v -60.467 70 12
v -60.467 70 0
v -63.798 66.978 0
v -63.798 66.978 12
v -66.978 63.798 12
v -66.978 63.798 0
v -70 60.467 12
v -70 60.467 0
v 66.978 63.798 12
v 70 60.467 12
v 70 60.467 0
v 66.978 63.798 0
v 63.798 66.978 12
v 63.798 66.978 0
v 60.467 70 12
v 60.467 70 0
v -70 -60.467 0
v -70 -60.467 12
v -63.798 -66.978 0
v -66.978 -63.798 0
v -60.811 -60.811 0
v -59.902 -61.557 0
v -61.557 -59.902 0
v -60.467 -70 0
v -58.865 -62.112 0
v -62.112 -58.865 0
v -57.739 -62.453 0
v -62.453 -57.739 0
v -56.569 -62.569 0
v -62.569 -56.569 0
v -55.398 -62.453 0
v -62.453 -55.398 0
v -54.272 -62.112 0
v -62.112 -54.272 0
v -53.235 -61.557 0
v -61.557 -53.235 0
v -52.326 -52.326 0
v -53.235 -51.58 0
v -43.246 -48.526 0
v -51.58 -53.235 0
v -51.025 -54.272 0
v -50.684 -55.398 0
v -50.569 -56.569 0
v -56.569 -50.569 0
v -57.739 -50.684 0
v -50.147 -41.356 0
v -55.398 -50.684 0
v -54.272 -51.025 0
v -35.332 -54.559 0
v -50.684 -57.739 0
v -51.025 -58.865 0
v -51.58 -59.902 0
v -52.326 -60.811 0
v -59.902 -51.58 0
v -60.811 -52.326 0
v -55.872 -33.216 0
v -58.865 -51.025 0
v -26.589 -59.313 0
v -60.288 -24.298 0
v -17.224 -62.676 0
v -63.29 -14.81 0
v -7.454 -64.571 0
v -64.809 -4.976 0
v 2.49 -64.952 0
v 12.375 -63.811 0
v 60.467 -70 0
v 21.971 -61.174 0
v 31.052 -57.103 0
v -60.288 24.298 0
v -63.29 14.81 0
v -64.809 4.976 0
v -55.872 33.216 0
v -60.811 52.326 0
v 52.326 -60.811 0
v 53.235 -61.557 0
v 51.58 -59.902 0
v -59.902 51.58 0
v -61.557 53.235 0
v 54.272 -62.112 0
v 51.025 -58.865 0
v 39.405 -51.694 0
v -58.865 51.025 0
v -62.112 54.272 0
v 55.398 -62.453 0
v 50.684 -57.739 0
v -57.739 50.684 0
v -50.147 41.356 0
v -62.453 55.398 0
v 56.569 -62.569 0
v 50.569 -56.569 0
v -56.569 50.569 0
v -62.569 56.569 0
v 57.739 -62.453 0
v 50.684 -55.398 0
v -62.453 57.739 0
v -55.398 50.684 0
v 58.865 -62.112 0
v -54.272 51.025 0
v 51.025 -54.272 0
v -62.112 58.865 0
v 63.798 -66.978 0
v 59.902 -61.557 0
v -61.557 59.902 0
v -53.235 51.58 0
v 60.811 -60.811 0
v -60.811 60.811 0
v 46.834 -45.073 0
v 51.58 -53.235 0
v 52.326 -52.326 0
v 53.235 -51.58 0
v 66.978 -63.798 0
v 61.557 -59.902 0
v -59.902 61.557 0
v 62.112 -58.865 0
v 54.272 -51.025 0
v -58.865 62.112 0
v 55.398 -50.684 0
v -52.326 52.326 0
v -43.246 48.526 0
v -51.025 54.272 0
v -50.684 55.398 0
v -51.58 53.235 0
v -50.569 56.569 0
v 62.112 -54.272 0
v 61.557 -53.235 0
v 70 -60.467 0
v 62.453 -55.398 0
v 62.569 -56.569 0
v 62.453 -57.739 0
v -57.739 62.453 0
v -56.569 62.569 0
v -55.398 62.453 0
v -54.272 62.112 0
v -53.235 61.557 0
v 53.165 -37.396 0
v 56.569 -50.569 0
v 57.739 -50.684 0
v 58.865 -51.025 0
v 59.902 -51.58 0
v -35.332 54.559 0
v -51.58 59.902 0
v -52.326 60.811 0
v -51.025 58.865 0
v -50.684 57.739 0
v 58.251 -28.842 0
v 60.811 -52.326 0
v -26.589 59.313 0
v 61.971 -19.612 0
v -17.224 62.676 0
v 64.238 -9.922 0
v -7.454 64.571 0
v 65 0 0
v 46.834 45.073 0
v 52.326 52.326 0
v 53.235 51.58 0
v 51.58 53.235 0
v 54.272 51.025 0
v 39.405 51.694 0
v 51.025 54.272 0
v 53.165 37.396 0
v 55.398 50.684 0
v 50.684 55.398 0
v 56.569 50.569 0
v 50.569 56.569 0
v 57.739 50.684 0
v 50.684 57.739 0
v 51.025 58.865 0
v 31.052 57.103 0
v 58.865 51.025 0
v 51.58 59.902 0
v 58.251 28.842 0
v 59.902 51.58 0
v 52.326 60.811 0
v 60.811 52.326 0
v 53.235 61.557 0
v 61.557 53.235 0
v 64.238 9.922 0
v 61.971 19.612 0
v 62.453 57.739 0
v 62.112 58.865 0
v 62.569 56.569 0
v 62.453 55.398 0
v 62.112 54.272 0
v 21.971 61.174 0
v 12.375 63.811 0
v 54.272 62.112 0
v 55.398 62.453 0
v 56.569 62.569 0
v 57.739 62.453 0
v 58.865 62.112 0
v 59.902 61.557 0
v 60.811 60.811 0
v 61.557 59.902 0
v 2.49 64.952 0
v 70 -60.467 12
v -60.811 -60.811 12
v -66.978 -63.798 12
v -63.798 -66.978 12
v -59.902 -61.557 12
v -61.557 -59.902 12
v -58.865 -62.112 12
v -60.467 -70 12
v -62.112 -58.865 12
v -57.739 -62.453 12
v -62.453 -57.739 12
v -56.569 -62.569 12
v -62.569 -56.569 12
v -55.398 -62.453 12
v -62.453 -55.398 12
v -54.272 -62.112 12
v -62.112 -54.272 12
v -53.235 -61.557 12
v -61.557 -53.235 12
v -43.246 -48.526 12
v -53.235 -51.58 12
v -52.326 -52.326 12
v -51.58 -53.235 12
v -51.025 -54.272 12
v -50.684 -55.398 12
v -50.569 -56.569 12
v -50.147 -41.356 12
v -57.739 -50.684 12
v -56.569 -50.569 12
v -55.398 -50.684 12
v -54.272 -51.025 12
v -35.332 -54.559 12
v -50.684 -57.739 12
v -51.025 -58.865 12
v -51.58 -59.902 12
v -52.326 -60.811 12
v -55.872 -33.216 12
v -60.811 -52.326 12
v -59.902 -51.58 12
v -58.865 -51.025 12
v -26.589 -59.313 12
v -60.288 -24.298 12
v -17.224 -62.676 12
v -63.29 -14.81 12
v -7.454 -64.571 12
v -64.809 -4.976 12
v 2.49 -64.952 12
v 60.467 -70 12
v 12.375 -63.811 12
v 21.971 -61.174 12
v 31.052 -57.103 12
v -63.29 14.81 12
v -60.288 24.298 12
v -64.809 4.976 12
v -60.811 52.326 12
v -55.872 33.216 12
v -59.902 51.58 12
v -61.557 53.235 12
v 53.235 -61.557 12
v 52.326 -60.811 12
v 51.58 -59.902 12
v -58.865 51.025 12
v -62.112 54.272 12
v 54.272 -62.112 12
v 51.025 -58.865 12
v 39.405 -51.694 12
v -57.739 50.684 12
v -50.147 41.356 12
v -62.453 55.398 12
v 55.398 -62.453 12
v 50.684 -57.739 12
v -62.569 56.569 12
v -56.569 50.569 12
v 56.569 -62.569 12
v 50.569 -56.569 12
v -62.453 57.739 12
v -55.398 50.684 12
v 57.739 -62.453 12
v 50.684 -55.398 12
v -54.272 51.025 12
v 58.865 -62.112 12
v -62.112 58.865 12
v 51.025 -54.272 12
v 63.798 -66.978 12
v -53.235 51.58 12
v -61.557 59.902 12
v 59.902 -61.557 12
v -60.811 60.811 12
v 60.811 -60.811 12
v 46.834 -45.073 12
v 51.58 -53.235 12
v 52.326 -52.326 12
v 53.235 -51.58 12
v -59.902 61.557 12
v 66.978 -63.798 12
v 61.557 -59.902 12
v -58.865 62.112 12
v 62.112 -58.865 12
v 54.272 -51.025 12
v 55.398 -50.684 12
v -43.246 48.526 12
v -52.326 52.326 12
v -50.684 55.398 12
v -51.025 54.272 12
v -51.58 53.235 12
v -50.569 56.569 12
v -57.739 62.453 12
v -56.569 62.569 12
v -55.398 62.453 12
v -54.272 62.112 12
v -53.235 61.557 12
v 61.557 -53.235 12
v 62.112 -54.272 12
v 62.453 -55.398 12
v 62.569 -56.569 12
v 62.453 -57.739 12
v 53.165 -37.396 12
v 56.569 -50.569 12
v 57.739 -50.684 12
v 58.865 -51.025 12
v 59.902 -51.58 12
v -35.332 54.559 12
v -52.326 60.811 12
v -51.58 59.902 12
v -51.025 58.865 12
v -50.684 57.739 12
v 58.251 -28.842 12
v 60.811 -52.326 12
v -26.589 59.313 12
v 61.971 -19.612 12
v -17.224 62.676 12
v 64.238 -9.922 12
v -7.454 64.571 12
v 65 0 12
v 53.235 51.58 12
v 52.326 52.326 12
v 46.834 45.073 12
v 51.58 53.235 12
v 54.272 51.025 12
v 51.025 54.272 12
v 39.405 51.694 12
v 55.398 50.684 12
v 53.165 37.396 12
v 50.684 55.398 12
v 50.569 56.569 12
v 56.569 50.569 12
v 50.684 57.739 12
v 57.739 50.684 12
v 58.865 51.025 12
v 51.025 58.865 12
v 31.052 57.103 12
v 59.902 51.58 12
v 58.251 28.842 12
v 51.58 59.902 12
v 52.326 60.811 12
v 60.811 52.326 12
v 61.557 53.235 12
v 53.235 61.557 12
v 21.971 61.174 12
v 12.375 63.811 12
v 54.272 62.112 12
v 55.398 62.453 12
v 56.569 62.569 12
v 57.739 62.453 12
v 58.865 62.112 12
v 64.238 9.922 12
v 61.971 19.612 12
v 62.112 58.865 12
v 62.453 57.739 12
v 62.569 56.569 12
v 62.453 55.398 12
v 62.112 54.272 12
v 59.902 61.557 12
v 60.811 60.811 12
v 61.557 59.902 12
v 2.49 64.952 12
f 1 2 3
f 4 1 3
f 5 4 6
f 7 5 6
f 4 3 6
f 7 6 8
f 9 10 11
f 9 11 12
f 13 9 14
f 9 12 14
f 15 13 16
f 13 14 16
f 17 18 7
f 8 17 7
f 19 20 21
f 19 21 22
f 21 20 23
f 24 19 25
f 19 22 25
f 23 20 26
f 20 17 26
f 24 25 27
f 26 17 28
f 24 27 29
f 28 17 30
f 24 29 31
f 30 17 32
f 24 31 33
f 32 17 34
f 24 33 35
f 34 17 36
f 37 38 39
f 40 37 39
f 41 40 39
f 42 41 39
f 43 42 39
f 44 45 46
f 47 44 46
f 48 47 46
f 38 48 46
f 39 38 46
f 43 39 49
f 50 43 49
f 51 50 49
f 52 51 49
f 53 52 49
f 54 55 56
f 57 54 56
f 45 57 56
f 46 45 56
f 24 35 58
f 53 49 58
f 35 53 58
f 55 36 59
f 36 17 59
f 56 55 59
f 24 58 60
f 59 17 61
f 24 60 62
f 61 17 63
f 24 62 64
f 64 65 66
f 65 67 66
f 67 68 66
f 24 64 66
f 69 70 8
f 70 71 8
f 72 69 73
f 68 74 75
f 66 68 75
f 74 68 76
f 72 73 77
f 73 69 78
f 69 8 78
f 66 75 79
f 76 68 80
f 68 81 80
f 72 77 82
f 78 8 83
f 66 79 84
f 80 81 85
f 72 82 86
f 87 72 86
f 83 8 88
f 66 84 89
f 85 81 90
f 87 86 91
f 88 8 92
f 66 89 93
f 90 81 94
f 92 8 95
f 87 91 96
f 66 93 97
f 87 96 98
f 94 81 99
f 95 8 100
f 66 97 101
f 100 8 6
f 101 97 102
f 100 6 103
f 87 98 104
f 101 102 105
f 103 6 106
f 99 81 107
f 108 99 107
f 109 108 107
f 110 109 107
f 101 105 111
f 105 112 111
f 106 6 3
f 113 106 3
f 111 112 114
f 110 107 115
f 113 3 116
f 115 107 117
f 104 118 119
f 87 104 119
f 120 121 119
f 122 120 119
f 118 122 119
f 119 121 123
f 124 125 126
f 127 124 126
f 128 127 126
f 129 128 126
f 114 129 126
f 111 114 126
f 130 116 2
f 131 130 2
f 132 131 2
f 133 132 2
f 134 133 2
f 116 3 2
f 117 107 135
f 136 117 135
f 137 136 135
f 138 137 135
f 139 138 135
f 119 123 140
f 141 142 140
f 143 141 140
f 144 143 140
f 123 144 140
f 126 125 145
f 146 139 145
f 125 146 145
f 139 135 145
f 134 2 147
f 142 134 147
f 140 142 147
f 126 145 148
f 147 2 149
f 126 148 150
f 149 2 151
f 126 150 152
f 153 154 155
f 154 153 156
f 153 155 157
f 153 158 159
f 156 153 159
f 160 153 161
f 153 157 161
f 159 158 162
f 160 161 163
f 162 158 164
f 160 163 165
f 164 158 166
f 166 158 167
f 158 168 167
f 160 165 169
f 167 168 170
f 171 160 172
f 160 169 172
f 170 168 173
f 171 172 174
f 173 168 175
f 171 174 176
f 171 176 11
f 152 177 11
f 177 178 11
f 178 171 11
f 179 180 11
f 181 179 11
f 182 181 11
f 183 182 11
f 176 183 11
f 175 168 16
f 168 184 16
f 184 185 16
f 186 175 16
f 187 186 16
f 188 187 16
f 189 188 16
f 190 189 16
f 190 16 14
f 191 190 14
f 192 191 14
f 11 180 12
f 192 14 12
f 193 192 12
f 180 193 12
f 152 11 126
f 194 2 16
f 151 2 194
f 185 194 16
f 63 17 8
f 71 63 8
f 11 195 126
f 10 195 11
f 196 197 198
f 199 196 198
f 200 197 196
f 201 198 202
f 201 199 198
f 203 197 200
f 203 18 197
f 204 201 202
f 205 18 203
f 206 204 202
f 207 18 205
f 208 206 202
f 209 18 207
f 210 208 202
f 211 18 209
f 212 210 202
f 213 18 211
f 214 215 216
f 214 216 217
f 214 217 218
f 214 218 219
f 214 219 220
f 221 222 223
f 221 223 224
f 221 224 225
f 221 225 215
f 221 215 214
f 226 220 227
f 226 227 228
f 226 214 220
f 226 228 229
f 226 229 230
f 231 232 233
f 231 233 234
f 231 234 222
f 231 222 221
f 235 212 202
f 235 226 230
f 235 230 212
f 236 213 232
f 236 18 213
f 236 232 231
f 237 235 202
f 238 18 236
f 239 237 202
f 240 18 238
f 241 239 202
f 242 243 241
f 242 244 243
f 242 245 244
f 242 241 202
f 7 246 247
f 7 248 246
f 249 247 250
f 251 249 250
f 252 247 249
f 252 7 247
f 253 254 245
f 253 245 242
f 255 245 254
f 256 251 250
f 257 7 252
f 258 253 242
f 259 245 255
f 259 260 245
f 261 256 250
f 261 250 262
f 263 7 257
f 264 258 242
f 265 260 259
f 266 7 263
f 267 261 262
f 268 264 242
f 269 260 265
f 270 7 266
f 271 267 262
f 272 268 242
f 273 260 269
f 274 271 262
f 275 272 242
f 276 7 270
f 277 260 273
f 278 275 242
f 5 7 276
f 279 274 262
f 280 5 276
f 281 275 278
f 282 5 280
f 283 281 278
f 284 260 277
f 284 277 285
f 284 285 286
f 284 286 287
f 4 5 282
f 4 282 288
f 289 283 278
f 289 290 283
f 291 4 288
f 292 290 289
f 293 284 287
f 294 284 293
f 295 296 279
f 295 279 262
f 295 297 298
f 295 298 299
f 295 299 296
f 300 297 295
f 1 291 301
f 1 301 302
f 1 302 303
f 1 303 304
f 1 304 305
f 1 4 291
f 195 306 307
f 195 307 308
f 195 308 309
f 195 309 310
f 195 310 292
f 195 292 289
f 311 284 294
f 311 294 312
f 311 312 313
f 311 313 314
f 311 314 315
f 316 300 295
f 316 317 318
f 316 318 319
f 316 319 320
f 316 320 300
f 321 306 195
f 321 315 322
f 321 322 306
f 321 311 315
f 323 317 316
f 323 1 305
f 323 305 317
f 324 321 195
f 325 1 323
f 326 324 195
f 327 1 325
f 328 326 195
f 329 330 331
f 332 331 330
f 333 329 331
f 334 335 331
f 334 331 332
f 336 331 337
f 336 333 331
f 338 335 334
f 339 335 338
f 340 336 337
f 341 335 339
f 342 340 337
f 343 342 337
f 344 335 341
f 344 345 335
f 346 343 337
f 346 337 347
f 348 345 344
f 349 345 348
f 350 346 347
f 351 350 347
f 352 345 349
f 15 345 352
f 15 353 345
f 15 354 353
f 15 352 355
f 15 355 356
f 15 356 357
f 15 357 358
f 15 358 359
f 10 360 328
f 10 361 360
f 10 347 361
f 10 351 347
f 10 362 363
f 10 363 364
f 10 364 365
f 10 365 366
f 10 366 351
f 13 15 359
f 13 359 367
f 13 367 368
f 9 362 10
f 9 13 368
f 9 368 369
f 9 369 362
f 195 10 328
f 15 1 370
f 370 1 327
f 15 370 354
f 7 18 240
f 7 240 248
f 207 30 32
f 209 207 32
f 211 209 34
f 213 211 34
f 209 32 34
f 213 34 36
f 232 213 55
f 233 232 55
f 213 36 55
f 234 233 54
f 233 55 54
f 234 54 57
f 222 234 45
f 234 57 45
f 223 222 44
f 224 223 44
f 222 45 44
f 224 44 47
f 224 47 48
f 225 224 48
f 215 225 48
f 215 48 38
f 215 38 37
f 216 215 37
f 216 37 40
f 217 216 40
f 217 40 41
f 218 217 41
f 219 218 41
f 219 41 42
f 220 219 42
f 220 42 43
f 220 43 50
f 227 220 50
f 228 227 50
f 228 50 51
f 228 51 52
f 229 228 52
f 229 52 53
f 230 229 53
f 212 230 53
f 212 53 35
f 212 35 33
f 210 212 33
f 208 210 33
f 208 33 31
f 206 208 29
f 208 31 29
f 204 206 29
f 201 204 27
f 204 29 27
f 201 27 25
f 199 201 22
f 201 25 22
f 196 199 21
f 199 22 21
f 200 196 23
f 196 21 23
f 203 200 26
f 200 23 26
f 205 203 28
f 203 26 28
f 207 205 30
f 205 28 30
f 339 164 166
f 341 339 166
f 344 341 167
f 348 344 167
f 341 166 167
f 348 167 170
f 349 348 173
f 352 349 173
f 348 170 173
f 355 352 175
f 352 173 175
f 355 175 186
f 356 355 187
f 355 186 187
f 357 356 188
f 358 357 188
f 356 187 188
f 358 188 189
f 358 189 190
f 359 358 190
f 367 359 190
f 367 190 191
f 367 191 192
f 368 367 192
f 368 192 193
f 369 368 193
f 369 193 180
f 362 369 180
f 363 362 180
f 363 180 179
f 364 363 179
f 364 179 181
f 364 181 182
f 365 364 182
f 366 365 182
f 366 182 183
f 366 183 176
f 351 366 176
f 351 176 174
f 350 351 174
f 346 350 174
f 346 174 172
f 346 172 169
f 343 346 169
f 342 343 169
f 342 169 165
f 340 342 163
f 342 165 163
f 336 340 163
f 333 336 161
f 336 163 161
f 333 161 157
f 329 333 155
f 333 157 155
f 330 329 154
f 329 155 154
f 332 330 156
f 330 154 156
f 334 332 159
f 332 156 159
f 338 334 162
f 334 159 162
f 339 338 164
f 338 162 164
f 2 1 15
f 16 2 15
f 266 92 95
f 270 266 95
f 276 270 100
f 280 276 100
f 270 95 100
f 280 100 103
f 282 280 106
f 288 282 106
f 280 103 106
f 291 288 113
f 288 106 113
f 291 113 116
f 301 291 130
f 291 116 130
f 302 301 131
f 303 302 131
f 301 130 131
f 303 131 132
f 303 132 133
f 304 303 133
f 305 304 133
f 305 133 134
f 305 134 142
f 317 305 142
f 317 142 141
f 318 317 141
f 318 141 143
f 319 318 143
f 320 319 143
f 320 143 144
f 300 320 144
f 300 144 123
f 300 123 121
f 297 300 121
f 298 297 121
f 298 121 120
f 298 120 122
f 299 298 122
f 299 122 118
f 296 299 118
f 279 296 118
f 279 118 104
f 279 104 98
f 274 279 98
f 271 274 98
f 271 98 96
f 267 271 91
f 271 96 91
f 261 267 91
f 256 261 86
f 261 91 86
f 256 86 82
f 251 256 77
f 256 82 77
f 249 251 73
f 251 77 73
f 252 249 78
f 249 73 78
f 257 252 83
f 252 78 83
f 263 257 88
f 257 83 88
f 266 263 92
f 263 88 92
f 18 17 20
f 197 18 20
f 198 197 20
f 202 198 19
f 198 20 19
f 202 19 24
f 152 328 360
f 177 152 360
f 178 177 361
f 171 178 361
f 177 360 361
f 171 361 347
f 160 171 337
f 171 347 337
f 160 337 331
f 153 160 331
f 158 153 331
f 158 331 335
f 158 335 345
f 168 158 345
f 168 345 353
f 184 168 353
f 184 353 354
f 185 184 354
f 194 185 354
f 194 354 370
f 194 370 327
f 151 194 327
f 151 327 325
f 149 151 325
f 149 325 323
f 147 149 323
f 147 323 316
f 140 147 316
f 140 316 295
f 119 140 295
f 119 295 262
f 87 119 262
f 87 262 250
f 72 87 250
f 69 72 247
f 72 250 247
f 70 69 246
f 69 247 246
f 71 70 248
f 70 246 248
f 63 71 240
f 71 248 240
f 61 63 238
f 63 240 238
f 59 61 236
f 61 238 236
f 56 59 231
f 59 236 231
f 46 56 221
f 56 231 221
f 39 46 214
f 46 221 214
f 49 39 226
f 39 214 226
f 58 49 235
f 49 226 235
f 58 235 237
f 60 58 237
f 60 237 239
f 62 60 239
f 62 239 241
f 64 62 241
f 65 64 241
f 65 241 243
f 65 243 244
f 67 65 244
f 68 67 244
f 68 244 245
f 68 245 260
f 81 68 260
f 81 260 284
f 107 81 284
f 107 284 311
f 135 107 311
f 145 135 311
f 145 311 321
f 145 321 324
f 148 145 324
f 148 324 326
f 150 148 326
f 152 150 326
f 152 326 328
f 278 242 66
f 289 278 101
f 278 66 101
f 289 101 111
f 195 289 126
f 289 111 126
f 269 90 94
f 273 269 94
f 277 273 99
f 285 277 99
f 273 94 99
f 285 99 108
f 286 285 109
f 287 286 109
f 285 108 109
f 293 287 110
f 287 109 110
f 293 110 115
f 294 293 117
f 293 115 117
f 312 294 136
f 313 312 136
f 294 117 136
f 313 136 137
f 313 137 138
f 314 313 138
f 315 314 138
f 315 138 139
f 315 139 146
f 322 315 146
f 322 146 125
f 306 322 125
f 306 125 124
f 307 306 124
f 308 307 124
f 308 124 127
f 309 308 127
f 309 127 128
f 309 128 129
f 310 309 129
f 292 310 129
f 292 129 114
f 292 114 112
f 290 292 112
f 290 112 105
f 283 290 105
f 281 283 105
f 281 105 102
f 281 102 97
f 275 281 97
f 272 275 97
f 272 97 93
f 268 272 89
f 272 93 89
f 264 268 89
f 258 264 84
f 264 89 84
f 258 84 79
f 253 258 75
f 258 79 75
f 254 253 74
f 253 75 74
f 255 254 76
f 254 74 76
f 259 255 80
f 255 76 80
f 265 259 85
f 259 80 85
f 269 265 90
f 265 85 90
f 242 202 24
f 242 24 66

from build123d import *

# Parameters (mm, degrees)
SKETCH1_R                  = 92.5
BOSS_EXTRUDE1_DEPTH        = 12
SKETCH2_OUTSIDE_W          = 239.38
SKETCH2_OUTSIDE_H          = 239.38
SKETCH2_OUTSIDE_W_2        = 140
SKETCH2_OUTSIDE_H_2        = 140
CUT_EXTRUDE1_DEPTH         = 132.363998112
SKETCH3_R                  = 65
CUT_EXTRUDE2_DEPTH         = 100.719606899
F_12_0_12_DIAMETER_HOLE1_D = 12


with BuildPart() as part:
    # Sketch1 → Boss-Extrude1 (new body)
    with BuildSketch(Plane.XY):
        Circle(SKETCH1_R)
    extrude(amount=BOSS_EXTRUDE1_DEPTH)

    # Sketch2 outside → Cut-Extrude1 (cut, through all)
    with BuildSketch(Plane.XY.offset(12)):
        Rectangle(SKETCH2_OUTSIDE_W, SKETCH2_OUTSIDE_H)
        Rectangle(SKETCH2_OUTSIDE_W_2, SKETCH2_OUTSIDE_H_2, mode=Mode.SUBTRACT)
    extrude(amount=-CUT_EXTRUDE1_DEPTH, mode=Mode.SUBTRACT)

    # Sketch3 → Cut-Extrude2 (cut, through all)
    with BuildSketch(Plane.XY.offset(12)):
        Circle(SKETCH3_R)
    extrude(amount=-CUT_EXTRUDE2_DEPTH, mode=Mode.SUBTRACT)

    # Ø12.0 (12) Diameter Hole1 (through all)
    with Locations(Plane.XY.offset(12)):
        with Locations((56.568542495, 56.568542495), (-56.568542495, 56.568542495), (-56.568542495, -56.568542495), (56.568542495, -56.568542495)):
            Hole(F_12_0_12_DIAMETER_HOLE1_D / 2)


solid = part.part
